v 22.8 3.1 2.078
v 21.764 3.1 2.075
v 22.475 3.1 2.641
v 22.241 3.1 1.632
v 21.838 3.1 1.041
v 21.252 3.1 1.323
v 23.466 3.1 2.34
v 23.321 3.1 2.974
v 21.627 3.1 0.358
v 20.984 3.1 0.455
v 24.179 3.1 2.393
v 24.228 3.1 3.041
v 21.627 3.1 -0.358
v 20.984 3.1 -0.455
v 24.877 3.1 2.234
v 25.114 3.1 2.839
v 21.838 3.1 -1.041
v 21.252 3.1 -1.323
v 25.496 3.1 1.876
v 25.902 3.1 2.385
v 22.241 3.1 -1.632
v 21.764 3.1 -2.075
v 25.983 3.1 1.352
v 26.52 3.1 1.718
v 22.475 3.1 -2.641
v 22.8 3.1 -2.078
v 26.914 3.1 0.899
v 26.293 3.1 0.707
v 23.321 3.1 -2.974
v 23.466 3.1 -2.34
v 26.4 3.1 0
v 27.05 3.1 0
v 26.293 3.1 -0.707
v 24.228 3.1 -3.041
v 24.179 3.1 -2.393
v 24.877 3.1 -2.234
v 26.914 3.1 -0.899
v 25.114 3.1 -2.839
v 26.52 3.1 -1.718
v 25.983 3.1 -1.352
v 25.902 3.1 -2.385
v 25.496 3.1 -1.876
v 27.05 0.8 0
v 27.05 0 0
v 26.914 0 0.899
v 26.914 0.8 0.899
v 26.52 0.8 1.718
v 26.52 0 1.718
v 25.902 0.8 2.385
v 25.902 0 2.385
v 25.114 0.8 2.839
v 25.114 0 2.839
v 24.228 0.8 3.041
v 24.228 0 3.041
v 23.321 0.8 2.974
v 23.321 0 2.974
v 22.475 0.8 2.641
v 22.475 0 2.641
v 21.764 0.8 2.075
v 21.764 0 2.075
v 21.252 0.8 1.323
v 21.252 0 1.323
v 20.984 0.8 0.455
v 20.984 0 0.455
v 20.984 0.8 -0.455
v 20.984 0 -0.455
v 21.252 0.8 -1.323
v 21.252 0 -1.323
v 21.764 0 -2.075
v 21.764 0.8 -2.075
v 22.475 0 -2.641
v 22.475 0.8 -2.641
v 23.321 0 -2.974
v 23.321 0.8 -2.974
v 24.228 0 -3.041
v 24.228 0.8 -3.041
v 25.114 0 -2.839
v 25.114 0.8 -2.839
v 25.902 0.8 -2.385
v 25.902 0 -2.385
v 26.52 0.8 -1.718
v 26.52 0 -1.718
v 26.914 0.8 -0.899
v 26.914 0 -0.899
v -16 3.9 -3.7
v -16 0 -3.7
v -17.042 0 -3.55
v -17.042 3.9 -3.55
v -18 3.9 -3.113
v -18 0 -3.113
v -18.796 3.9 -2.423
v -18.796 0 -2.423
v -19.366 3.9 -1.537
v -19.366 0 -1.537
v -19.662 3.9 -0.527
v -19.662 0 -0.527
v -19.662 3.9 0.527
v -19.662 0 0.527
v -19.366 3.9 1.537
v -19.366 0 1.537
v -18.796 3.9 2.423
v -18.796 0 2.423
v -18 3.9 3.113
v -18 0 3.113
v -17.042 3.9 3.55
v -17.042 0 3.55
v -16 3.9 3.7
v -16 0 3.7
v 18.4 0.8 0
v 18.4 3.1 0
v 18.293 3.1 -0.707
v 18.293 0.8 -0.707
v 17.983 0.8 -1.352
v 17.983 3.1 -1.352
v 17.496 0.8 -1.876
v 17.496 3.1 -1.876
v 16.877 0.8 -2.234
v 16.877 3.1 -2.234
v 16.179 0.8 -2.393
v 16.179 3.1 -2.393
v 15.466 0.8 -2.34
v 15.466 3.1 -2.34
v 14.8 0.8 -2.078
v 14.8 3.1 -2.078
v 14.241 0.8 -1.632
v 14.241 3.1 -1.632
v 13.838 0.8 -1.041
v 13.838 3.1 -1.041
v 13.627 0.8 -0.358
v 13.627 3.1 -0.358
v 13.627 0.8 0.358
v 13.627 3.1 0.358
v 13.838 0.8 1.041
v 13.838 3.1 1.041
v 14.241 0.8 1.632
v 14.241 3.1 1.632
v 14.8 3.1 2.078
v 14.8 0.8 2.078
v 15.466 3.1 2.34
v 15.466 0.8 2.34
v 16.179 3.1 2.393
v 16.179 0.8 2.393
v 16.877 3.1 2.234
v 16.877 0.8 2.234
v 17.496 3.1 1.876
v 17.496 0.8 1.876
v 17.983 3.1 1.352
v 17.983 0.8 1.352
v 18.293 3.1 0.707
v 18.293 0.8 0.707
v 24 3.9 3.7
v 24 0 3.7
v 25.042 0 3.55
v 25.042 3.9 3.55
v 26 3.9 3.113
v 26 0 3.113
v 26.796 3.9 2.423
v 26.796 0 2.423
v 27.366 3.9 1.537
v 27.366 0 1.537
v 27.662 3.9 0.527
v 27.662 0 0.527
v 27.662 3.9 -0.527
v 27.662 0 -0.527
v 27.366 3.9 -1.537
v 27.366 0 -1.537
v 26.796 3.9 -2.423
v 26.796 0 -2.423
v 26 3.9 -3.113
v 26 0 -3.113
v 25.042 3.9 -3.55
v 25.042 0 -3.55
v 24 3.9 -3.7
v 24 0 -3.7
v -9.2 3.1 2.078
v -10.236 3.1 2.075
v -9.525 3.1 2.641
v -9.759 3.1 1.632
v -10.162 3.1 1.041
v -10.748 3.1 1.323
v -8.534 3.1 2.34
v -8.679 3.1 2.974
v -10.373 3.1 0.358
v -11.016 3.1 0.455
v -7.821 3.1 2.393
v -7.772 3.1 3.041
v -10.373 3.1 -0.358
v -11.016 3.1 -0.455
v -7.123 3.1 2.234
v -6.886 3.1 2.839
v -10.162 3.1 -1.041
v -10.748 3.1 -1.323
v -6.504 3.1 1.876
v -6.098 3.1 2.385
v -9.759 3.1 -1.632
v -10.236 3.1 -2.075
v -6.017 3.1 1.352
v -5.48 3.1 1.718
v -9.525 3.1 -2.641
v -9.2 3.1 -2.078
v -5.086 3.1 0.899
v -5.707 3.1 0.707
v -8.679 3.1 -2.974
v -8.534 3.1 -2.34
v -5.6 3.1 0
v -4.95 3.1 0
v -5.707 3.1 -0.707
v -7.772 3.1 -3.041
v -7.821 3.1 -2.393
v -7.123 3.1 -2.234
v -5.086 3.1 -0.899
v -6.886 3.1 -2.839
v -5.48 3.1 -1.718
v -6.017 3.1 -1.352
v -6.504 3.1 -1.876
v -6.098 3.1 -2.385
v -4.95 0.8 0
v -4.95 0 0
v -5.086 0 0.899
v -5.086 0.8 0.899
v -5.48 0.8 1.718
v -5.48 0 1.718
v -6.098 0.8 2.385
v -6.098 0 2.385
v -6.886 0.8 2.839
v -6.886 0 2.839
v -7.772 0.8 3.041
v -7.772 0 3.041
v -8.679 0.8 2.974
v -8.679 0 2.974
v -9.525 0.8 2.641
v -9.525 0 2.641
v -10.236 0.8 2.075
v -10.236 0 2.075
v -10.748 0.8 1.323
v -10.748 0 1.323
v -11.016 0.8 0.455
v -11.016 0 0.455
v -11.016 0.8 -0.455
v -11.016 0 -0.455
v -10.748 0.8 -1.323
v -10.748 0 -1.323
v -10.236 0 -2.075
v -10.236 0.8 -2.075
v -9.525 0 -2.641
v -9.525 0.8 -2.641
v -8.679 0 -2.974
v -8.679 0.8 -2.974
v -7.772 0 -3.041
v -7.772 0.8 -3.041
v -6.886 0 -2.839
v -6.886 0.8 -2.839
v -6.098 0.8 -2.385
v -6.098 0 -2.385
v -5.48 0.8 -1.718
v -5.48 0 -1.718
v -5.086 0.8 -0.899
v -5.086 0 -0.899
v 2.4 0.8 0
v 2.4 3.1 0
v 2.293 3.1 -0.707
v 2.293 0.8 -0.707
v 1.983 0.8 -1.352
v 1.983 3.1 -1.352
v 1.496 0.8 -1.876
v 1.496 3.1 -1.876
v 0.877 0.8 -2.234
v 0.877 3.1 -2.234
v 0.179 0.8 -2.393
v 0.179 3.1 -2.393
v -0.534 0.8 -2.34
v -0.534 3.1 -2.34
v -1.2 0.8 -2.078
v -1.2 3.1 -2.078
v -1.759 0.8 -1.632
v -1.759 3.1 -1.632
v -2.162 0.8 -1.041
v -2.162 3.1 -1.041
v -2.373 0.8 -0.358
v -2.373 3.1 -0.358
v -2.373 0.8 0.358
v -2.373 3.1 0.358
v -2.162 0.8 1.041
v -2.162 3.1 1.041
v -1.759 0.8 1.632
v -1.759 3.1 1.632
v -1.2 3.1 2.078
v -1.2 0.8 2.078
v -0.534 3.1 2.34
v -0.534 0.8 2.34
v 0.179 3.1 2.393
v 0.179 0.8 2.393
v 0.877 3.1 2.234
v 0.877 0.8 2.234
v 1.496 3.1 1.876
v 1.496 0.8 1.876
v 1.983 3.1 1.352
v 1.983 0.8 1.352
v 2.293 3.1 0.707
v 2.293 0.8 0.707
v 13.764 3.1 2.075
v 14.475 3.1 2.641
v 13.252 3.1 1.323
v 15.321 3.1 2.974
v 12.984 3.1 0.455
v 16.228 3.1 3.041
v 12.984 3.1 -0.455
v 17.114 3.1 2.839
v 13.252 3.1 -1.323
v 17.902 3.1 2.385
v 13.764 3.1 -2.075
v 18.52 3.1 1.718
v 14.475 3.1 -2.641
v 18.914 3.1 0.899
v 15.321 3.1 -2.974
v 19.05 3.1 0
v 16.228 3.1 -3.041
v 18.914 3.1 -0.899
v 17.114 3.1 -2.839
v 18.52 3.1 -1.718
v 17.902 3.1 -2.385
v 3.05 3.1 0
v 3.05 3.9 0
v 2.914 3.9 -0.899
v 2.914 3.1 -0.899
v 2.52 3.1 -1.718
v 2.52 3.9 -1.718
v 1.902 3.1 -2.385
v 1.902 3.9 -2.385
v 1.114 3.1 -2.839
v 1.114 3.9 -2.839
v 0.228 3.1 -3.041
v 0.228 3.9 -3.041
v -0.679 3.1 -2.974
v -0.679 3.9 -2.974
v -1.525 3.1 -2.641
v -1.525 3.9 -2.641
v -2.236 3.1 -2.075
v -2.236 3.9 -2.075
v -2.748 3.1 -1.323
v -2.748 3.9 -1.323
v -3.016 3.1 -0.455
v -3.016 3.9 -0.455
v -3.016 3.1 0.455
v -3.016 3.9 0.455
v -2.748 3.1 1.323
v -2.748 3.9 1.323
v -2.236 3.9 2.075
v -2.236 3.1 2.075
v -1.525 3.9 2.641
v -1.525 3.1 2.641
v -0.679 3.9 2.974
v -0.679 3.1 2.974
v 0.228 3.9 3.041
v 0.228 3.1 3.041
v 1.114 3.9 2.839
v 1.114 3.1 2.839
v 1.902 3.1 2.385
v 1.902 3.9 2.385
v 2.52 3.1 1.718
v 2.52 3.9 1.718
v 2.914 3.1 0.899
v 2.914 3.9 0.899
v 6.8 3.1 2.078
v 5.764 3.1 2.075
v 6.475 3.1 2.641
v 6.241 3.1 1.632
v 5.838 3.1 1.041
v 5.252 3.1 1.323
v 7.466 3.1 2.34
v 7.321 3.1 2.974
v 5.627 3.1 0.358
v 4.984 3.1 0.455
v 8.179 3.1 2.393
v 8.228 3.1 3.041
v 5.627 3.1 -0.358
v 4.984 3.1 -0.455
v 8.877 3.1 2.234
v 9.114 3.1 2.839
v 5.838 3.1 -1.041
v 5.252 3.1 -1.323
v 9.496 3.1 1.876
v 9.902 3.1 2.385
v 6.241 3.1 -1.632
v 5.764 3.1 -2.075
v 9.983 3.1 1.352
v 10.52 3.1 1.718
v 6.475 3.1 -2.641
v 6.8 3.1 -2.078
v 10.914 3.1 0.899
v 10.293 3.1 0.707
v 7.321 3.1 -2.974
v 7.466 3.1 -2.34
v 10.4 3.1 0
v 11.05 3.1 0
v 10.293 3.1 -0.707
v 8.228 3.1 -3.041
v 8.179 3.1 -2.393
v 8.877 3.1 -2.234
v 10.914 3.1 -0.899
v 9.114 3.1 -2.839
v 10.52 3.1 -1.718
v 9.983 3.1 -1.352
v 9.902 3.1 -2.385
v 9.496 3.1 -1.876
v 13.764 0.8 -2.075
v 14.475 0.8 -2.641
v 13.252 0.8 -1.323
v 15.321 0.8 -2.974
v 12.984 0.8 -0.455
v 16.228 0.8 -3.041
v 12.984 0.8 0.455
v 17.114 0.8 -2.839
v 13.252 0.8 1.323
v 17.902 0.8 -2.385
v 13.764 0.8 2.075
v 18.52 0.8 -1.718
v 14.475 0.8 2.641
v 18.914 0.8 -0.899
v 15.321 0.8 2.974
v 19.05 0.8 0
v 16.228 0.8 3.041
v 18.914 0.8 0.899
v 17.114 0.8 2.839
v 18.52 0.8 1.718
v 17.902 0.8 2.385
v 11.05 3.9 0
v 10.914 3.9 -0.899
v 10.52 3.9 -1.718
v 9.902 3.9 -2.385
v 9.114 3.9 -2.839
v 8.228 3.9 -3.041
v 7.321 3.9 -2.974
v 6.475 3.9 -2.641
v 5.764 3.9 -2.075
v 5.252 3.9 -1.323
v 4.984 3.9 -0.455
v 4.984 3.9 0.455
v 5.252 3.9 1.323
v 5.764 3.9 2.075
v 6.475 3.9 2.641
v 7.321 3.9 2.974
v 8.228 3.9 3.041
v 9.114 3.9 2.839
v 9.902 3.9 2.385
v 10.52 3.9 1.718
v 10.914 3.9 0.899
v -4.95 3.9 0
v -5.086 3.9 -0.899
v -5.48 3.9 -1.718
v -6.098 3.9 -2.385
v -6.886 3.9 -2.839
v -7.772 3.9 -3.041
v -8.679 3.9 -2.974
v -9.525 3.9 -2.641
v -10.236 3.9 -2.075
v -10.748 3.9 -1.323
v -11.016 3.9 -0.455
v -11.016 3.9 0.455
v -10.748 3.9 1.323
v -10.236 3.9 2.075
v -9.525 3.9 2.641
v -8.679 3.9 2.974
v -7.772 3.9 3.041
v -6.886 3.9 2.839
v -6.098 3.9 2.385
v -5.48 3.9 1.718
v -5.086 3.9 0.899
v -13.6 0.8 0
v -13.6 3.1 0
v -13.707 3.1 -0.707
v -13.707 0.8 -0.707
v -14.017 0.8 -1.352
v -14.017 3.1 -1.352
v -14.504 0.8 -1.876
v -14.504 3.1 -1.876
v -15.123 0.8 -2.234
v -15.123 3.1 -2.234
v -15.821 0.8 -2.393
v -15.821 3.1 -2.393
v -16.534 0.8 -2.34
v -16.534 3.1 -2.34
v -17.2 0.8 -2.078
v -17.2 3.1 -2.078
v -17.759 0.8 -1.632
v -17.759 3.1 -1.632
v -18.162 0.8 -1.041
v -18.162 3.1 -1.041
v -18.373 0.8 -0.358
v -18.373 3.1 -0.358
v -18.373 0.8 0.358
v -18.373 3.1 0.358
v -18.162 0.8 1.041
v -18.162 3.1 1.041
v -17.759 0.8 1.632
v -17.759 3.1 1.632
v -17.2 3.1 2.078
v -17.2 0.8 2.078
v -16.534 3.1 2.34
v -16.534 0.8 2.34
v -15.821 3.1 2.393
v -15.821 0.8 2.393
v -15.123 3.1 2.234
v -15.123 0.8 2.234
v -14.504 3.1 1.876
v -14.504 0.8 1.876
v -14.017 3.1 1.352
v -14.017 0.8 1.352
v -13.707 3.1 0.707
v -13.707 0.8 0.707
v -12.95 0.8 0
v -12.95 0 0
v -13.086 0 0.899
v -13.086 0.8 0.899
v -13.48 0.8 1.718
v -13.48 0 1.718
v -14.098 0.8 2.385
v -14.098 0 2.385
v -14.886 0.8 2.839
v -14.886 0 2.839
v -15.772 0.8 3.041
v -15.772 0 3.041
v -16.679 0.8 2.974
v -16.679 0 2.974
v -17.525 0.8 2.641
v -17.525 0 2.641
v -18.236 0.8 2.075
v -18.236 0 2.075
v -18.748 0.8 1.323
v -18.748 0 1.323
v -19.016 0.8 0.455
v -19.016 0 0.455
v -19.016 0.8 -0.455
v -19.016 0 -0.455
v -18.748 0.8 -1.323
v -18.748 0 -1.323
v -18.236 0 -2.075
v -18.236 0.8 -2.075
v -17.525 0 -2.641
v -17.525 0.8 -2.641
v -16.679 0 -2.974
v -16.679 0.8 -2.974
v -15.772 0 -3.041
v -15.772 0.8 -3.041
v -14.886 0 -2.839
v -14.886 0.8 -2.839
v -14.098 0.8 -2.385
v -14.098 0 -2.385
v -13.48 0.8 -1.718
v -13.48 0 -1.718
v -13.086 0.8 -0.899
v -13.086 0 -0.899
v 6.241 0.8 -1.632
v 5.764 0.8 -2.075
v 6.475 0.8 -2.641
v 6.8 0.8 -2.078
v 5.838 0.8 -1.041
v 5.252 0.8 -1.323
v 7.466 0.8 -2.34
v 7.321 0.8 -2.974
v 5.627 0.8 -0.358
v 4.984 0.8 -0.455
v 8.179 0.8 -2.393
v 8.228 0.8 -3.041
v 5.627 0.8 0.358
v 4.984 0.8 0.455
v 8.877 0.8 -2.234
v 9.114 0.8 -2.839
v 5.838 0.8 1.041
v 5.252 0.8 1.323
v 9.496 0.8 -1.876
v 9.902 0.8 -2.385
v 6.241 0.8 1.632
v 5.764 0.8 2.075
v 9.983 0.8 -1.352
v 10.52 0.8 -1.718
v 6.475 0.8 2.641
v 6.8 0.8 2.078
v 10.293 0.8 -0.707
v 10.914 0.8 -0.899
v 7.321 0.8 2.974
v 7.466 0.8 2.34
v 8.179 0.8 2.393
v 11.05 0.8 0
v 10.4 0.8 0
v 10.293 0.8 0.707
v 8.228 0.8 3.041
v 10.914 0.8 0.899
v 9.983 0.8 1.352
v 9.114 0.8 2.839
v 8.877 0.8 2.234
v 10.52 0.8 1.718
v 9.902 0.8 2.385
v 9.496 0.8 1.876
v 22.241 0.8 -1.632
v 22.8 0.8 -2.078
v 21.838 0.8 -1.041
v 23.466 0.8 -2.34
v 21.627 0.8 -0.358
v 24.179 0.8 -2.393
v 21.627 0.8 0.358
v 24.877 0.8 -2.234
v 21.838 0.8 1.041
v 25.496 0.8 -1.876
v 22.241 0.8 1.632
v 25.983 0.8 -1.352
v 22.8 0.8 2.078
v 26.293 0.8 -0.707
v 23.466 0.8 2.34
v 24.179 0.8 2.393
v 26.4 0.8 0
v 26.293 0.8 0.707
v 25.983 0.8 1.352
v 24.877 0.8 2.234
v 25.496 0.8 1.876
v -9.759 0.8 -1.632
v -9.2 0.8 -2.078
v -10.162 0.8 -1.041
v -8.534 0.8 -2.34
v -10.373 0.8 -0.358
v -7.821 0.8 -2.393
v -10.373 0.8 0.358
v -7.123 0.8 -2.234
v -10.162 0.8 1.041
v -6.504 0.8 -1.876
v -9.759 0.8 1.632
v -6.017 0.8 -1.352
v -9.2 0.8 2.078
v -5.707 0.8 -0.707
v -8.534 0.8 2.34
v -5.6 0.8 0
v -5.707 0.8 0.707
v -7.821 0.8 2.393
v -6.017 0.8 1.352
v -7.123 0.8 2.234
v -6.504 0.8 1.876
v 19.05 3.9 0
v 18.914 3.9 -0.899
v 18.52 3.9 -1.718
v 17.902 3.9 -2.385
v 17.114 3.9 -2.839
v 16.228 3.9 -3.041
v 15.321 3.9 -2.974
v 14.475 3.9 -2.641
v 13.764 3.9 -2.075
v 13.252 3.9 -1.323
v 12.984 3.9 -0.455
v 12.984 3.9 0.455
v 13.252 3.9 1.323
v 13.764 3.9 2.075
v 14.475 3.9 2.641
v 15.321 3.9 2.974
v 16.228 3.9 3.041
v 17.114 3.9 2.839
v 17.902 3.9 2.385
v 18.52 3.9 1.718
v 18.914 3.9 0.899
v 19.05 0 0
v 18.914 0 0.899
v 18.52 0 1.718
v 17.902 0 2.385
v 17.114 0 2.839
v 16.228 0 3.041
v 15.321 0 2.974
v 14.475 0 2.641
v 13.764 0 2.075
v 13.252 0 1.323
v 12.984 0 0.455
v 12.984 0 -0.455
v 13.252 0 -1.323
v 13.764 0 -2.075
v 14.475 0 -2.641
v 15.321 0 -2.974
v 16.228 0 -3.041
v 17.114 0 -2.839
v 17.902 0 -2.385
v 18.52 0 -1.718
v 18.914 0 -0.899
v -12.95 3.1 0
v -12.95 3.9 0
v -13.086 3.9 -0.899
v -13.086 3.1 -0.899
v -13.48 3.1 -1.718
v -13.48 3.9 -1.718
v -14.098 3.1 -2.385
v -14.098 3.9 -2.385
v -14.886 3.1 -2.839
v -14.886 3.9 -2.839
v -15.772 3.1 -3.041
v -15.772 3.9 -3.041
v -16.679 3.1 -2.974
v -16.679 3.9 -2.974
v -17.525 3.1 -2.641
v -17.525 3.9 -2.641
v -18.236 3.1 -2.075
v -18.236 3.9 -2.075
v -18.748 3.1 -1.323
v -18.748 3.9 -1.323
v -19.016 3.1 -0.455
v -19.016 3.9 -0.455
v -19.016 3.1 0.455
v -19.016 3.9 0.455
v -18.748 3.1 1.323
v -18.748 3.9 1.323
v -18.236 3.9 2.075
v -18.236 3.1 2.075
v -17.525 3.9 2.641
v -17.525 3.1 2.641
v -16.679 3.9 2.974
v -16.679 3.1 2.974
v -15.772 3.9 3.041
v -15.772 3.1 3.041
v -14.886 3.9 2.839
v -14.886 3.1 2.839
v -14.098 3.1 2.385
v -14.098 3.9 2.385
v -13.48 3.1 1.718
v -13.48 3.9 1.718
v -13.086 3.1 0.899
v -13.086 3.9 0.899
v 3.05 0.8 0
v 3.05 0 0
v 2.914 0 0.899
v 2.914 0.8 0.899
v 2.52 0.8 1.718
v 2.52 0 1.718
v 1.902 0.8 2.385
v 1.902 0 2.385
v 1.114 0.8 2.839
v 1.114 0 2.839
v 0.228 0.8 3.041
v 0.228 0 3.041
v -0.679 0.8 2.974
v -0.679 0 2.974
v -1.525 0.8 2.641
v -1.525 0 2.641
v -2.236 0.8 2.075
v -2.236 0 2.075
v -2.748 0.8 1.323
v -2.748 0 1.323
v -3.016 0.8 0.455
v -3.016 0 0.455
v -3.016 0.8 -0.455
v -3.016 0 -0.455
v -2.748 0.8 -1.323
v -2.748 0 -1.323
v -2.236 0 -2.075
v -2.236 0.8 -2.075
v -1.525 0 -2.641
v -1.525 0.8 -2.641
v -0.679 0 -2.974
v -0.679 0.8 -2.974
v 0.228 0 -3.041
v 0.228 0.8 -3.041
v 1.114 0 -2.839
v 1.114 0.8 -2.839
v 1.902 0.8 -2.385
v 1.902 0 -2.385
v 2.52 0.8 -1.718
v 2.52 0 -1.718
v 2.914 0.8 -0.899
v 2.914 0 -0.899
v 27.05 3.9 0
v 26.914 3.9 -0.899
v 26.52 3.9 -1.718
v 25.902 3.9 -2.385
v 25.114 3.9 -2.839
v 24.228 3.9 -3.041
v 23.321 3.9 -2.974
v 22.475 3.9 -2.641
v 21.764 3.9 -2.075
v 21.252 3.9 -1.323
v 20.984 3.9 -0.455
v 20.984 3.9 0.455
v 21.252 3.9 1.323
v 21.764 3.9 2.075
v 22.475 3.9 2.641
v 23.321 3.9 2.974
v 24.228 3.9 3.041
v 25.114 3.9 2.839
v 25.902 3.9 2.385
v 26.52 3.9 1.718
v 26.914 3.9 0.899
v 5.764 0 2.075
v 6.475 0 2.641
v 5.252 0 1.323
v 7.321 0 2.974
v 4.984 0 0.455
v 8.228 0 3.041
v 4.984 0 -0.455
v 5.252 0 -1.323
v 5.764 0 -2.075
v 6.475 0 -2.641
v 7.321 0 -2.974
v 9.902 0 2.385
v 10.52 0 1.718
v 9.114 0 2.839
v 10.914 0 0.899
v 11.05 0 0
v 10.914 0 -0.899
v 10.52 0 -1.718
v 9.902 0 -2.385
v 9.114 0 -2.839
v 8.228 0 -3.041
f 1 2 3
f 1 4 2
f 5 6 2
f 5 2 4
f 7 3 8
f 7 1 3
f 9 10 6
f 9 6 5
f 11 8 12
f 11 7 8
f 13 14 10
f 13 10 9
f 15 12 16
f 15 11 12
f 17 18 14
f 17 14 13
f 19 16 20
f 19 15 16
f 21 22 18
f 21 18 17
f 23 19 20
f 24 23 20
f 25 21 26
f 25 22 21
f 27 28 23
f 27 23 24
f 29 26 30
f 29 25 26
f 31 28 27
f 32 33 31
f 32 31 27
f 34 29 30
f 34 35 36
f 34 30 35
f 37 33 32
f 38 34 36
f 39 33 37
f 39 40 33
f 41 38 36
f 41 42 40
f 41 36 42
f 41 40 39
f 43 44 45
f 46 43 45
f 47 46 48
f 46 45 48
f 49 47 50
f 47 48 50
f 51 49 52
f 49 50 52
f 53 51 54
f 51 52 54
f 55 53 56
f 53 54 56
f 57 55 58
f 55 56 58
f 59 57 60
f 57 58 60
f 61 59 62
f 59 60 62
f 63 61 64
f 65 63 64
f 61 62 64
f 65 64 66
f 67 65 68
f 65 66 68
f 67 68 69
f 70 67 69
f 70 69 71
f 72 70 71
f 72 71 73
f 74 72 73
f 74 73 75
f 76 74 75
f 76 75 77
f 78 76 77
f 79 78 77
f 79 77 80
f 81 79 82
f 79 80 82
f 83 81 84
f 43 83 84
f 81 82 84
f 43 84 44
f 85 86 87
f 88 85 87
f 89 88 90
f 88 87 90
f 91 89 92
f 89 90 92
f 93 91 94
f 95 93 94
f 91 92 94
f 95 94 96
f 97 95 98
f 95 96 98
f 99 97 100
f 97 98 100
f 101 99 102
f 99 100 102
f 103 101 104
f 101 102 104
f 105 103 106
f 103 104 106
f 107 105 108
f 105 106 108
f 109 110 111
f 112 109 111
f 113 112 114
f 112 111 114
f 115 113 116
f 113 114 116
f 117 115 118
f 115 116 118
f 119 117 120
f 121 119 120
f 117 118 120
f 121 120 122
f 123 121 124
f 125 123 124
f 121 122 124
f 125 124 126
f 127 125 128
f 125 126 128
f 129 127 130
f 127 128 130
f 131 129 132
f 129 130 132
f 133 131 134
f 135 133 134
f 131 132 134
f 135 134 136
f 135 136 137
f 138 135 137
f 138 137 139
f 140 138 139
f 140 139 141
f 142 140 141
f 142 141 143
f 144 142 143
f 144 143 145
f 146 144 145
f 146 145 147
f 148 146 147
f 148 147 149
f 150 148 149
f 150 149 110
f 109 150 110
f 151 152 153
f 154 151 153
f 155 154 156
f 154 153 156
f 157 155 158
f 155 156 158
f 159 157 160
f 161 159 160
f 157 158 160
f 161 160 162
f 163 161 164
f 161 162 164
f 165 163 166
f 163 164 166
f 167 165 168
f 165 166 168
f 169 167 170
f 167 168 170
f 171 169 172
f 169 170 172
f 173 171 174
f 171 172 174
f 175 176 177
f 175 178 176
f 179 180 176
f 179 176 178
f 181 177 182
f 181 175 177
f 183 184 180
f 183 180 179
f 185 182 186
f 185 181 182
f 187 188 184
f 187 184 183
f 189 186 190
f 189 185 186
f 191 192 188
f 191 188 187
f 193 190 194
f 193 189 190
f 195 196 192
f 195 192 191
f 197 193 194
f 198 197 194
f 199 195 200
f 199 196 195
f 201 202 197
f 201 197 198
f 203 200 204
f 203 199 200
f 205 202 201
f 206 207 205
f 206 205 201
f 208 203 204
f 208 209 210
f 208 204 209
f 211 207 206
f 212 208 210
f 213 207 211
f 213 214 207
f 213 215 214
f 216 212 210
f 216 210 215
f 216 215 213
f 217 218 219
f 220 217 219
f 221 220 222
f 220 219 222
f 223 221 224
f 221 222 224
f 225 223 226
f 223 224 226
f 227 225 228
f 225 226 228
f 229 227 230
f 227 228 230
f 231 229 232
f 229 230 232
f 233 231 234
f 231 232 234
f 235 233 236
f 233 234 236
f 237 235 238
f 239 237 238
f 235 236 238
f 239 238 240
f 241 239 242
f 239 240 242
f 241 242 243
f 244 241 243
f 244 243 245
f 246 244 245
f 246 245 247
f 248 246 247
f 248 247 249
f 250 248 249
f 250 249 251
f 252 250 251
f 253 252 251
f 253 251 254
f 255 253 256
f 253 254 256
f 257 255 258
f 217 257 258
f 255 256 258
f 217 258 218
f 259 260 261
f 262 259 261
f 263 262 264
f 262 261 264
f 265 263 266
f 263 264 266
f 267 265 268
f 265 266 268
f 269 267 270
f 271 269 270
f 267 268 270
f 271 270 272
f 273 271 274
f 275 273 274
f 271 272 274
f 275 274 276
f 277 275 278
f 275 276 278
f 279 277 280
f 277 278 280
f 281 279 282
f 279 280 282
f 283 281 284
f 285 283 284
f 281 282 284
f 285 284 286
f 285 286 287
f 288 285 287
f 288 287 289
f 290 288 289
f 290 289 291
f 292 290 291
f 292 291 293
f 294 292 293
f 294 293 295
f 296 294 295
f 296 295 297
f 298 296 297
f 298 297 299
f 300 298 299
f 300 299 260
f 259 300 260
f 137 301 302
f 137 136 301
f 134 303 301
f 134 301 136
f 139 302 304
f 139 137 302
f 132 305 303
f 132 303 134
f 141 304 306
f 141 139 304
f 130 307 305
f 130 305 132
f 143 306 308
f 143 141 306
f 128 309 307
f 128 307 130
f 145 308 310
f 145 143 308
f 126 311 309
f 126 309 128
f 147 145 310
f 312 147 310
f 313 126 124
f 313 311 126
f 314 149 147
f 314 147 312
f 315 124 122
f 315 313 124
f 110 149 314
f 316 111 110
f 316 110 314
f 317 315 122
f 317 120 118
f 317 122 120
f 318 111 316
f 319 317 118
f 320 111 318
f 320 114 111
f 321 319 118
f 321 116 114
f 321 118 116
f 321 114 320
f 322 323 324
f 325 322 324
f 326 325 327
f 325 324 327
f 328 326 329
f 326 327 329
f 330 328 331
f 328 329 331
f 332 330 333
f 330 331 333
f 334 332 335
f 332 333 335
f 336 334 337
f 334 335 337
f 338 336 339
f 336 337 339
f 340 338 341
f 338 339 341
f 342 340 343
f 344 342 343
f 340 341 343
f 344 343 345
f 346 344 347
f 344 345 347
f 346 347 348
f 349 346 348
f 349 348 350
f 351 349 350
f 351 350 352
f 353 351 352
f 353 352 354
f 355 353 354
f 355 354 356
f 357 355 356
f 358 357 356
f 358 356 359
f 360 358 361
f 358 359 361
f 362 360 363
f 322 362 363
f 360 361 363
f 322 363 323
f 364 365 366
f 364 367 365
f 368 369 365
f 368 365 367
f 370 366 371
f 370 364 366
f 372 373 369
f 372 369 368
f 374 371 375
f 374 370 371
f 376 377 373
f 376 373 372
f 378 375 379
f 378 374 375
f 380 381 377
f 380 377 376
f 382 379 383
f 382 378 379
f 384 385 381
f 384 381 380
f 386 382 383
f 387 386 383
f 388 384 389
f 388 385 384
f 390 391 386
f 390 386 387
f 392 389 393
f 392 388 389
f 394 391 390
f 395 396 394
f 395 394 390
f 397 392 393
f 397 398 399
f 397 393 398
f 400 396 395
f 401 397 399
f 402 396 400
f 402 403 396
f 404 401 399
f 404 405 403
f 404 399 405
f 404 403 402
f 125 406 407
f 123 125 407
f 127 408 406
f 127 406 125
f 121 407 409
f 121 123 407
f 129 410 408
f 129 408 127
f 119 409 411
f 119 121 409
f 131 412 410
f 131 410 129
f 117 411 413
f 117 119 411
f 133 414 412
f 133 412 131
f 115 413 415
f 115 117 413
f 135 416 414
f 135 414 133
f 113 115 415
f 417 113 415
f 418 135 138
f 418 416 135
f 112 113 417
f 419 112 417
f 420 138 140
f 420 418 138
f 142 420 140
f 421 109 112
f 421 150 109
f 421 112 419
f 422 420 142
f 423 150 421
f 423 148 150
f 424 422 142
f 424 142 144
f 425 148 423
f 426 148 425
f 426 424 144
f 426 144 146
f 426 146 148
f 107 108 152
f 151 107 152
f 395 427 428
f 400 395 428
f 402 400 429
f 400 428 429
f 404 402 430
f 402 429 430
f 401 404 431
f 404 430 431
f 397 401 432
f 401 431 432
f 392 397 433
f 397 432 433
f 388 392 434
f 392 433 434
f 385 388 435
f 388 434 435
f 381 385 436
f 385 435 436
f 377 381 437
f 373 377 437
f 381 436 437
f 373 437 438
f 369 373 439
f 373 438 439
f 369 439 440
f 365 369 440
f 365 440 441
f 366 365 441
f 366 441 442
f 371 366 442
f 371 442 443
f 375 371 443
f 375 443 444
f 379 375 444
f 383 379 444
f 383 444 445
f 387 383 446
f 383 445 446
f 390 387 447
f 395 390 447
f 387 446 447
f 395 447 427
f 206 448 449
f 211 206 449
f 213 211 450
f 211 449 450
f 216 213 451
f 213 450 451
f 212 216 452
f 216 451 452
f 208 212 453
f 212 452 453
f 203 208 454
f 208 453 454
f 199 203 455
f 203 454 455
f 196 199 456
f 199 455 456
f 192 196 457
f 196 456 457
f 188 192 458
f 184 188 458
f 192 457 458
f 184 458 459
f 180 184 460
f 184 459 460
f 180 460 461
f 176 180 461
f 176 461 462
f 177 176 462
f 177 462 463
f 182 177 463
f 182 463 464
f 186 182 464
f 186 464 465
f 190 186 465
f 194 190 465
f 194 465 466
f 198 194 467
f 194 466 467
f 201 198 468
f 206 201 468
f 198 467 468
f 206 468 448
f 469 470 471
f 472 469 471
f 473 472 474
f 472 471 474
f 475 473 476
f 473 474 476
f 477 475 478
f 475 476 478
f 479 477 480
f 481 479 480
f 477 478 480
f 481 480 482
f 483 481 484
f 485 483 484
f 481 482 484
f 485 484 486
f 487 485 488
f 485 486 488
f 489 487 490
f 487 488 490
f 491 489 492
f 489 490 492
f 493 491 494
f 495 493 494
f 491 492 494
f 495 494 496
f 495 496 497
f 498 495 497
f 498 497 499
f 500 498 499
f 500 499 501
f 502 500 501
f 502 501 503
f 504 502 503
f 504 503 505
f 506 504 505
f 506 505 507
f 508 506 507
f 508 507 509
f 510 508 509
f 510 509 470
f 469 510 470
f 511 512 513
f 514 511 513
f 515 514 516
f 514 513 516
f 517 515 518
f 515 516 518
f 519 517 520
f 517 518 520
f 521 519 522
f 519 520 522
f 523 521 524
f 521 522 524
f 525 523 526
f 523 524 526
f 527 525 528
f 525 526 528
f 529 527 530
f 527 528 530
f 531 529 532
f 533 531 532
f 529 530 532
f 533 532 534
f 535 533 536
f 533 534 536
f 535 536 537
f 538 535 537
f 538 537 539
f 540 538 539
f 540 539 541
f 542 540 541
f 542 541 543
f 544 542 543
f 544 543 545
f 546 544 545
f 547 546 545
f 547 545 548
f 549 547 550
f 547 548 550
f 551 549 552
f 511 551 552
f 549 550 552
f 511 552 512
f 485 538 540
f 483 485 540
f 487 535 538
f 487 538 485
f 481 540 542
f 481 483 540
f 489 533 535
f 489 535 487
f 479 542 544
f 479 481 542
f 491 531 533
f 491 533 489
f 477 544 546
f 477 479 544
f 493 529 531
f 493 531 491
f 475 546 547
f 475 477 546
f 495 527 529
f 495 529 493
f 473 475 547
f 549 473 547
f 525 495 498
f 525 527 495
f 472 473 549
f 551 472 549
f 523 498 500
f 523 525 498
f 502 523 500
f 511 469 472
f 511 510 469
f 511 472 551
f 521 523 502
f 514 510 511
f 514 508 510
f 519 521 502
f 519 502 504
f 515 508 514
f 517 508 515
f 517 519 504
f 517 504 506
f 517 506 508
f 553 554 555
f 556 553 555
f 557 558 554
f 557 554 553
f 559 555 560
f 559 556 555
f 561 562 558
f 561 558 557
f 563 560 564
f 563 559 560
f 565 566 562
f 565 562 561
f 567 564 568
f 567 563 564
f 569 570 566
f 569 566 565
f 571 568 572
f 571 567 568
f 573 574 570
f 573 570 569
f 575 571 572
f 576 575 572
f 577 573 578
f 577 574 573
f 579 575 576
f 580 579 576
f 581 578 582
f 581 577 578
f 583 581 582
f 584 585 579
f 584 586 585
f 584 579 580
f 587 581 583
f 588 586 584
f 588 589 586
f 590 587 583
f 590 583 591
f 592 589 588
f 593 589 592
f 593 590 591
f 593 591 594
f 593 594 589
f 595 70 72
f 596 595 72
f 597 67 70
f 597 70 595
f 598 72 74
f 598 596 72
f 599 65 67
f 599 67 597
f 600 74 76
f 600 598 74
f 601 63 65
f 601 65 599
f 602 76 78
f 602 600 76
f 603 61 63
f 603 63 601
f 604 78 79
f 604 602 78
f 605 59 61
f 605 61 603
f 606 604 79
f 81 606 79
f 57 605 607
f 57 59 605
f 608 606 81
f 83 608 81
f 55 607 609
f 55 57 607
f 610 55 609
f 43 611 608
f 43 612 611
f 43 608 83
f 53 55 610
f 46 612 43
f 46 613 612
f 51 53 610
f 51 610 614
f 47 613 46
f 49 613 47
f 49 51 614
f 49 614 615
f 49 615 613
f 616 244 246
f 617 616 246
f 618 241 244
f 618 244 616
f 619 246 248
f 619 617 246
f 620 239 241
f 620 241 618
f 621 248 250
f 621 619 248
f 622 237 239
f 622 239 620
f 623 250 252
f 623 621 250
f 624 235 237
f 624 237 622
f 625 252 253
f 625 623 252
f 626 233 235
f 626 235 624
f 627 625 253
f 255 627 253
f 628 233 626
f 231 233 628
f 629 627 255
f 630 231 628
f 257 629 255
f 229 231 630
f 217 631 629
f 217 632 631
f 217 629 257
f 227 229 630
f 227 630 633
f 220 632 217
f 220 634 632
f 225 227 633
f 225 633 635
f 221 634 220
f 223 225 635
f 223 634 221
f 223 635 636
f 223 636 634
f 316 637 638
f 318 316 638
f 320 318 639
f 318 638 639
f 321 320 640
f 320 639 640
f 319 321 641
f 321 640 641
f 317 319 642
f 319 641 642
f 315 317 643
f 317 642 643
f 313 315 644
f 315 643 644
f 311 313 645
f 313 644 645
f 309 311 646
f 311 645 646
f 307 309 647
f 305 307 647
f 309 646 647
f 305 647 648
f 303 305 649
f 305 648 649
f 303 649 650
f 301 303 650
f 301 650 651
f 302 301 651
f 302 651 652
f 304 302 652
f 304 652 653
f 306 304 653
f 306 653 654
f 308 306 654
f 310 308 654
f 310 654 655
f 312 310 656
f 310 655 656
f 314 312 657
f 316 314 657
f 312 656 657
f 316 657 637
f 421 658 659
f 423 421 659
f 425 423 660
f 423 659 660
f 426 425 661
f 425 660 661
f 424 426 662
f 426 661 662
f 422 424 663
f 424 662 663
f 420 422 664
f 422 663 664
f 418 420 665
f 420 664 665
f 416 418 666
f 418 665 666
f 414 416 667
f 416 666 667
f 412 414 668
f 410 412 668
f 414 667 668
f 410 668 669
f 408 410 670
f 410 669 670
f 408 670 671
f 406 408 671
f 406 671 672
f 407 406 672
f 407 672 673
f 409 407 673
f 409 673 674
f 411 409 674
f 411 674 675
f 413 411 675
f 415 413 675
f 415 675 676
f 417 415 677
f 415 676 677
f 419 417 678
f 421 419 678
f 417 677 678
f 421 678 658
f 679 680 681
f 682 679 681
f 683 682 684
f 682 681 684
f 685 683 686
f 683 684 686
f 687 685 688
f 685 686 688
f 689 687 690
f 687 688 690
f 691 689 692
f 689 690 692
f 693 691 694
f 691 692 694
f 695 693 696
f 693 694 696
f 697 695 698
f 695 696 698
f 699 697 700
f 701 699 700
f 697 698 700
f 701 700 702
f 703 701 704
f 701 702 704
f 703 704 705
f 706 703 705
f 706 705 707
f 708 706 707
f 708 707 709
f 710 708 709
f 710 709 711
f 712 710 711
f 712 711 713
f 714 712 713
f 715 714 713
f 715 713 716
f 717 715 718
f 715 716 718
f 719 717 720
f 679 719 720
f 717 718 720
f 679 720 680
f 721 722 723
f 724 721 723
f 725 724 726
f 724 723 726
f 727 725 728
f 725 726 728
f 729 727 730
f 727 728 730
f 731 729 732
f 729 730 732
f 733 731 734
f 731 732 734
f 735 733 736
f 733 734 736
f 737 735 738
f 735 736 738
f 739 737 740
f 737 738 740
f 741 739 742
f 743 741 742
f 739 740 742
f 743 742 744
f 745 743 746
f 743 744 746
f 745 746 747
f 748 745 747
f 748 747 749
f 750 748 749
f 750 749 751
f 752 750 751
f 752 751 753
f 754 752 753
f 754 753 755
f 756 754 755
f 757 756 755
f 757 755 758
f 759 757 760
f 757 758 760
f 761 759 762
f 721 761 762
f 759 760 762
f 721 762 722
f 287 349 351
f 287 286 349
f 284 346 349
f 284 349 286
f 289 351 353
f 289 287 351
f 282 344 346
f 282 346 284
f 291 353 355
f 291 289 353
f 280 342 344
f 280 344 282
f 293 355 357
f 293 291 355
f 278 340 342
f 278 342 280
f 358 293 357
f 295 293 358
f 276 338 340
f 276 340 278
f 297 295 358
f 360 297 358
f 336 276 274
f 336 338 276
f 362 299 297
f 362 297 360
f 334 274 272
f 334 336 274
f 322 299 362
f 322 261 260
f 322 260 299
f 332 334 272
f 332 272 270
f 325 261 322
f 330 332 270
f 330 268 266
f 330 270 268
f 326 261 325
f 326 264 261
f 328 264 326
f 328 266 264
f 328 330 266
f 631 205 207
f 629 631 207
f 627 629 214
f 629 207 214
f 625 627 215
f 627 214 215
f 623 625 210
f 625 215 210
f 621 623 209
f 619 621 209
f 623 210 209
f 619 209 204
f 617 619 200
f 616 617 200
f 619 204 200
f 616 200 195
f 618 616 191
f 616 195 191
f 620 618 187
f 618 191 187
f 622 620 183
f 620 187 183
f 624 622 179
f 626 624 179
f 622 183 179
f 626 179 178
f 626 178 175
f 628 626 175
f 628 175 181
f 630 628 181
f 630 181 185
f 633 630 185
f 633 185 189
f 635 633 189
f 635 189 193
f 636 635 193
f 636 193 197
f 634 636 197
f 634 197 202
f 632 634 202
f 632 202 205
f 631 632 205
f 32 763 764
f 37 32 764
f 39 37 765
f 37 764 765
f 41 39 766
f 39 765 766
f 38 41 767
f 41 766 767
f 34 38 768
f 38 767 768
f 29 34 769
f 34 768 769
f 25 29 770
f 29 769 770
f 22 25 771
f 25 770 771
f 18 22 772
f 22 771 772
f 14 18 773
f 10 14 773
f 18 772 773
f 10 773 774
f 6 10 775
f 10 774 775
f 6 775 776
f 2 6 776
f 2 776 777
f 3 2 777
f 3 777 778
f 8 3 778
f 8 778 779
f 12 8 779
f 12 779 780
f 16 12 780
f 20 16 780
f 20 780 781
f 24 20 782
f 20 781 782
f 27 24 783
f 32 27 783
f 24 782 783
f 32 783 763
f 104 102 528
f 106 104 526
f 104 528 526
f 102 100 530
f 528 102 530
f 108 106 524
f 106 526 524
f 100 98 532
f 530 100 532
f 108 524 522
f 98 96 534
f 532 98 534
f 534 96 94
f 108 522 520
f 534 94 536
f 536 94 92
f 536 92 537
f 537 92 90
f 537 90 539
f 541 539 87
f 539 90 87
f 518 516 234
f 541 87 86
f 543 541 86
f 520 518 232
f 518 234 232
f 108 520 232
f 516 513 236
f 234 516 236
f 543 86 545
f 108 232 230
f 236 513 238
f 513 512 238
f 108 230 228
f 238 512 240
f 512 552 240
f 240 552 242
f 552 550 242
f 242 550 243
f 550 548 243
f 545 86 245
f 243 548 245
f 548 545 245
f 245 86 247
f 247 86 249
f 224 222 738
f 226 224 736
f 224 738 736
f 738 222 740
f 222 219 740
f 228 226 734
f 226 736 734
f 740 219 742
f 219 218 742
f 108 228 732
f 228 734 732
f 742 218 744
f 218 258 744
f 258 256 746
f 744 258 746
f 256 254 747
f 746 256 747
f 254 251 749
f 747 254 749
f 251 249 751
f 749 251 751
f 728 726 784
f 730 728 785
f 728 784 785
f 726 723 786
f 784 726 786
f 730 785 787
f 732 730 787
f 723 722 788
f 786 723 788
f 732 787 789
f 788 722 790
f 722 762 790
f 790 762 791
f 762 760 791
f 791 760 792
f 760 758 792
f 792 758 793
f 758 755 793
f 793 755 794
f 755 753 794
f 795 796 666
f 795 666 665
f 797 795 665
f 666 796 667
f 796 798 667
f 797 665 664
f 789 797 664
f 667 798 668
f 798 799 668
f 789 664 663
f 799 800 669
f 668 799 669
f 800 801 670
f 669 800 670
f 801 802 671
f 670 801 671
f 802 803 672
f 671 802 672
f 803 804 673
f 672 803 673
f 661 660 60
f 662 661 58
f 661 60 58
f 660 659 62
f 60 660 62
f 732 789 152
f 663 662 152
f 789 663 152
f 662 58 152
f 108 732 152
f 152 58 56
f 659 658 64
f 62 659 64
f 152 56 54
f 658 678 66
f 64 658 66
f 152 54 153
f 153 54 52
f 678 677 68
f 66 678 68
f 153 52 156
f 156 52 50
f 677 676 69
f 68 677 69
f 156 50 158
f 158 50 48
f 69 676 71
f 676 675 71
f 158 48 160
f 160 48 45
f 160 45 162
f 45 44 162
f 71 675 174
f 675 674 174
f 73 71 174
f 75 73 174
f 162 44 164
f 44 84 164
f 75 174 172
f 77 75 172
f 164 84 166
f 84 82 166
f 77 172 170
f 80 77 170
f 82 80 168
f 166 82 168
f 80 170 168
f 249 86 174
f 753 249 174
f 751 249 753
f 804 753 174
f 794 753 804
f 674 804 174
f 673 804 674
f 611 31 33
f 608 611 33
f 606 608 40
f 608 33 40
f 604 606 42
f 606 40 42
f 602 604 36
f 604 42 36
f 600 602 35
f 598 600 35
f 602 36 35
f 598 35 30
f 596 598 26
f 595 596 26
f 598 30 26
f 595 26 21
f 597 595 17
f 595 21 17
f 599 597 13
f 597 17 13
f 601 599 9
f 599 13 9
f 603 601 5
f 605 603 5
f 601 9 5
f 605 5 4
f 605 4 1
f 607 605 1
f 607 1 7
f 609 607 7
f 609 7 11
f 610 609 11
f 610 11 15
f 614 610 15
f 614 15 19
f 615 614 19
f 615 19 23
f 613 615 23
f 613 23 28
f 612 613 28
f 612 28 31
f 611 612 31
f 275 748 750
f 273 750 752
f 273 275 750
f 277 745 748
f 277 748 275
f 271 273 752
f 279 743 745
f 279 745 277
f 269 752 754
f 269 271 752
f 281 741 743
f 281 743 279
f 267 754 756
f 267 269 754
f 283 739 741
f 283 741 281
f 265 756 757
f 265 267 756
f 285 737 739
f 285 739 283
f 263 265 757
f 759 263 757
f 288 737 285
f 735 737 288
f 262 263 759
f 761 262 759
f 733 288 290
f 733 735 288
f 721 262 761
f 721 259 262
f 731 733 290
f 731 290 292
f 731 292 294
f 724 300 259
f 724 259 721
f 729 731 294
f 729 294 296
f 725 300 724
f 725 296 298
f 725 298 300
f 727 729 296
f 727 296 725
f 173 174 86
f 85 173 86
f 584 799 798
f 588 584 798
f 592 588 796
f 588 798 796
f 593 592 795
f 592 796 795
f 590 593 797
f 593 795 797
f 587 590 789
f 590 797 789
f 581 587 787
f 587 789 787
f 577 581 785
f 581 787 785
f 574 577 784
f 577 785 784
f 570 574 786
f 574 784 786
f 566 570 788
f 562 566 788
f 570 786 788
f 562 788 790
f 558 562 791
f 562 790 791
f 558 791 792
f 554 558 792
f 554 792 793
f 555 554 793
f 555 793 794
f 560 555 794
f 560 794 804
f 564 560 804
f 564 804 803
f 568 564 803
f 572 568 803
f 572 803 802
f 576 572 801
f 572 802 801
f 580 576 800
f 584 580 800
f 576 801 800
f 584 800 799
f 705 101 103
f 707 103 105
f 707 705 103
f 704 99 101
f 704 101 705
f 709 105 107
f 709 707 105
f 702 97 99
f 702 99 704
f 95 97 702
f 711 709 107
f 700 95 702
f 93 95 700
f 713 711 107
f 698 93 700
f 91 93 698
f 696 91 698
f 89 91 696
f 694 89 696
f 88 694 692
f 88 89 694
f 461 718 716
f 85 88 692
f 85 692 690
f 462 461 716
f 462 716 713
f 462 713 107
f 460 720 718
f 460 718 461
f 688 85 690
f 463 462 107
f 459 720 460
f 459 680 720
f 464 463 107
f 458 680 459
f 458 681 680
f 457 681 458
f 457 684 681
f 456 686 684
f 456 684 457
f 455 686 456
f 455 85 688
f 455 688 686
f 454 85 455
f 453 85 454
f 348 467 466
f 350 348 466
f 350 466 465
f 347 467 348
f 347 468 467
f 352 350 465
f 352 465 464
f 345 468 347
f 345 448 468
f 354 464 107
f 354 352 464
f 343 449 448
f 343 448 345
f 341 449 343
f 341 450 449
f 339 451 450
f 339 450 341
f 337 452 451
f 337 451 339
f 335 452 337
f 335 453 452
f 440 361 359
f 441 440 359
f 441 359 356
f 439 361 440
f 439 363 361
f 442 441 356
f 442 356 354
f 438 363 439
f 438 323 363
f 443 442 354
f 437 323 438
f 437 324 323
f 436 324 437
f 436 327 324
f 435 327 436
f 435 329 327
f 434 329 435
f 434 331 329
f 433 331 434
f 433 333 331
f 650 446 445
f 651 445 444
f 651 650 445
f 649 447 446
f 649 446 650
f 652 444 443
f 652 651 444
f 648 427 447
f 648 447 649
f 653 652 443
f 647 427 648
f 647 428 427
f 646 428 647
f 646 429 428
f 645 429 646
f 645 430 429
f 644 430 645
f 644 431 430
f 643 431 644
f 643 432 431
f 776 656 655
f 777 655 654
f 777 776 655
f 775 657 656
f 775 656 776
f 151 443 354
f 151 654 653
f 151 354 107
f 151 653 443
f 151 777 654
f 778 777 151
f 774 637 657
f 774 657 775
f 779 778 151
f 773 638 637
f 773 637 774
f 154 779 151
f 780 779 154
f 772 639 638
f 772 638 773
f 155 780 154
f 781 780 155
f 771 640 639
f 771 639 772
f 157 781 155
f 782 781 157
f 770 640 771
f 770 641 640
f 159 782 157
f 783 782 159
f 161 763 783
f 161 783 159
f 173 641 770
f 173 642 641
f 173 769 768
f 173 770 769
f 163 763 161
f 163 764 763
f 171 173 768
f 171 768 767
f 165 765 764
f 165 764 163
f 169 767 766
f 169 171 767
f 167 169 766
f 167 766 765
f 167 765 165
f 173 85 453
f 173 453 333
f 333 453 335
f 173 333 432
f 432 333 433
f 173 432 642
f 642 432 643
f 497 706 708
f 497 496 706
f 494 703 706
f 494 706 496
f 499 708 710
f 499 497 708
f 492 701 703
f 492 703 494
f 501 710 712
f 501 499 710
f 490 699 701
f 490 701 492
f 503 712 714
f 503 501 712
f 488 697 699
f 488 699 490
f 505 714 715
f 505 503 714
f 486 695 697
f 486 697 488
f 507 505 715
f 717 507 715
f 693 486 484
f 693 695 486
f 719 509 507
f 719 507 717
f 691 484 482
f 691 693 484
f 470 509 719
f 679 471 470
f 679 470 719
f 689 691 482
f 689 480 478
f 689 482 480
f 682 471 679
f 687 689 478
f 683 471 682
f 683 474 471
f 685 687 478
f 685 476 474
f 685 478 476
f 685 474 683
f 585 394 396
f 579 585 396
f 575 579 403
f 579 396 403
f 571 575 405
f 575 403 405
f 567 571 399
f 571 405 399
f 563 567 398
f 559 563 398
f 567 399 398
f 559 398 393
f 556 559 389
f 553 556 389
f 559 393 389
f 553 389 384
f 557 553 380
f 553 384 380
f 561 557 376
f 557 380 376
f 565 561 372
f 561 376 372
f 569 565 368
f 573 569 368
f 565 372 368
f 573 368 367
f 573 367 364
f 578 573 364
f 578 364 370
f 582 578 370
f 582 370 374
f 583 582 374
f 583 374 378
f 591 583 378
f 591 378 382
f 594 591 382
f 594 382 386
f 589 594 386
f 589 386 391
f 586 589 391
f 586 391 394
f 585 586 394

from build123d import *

# Parameters (mm, degrees)
BOSS_EXTRUDE3_DEPTH = 3.9
SKETCH2_R           = 2.4
CUT_EXTRUDE1_DEPTH  = 7.8
SKETCH3_R           = 3.05
CUT_EXTRUDE2_DEPTH  = 0.8
SKETCH4_R           = 3.05
CUT_EXTRUDE3_DEPTH  = 0.8


with BuildPart() as part:
    # Sketch1 → Boss-Extrude3 (new body)
    with BuildSketch(Plane(origin=(0, 0, 0), x_dir=(1, 0, 0), z_dir=(0, 1, 0))):
        with BuildLine():
            Line((-16, -3.7), (24, -3.7))
            ThreePointArc((24, -3.7), (27.7, 0), (24, 3.7))
            Line((24, 3.7), (-16, 3.7))
            ThreePointArc((-16, 3.7), (-19.7, 0), (-16, -3.7))
        make_face()
    extrude(amount=BOSS_EXTRUDE3_DEPTH)

    # Sketch2 → Cut-Extrude1 (cut)
    with BuildSketch(Plane(origin=(0, 3.9, 0), x_dir=(1, 0, 0), z_dir=(0, 1, 0))):
        Circle(SKETCH2_R)
        with Locations((8, 0)):
            Circle(SKETCH2_R)
        with Locations((16, 0)):
            Circle(SKETCH2_R)
        with Locations((-16, 0)):
            Circle(SKETCH2_R)
        with Locations((-8, 0)):
            Circle(SKETCH2_R)
        with Locations((24, 0)):
            Circle(SKETCH2_R)
    extrude(amount=-CUT_EXTRUDE1_DEPTH, mode=Mode.SUBTRACT)

    # Sketch3 → Cut-Extrude2 (cut)
    with BuildSketch(Plane(origin=(0, 3.9, 0), x_dir=(1, 0, 0), z_dir=(0, 1, 0))):
        Circle(SKETCH3_R)
        with Locations((8, 0)):
            Circle(SKETCH3_R)
        with Locations((16, 0)):
            Circle(SKETCH3_R)
        with Locations((-16, 0)):
            Circle(SKETCH3_R)
        with Locations((-8, 0)):
            Circle(SKETCH3_R)
        with Locations((24, 0)):
            Circle(SKETCH3_R)
    extrude(amount=-CUT_EXTRUDE2_DEPTH, mode=Mode.SUBTRACT)

    # Sketch4 → Cut-Extrude3 (cut)
    with BuildSketch(Plane.XZ):
        Circle(SKETCH4_R)
        with Locations((8, 0)):
            Circle(SKETCH4_R)
        with Locations((16, 0)):
            Circle(SKETCH4_R)
        with Locations((-16, 0)):
            Circle(SKETCH4_R)
        with Locations((-8, 0)):
            Circle(SKETCH4_R)
        with Locations((24, 0)):
            Circle(SKETCH4_R)
    extrude(amount=-CUT_EXTRUDE3_DEPTH, mode=Mode.SUBTRACT)


solid = part.part
